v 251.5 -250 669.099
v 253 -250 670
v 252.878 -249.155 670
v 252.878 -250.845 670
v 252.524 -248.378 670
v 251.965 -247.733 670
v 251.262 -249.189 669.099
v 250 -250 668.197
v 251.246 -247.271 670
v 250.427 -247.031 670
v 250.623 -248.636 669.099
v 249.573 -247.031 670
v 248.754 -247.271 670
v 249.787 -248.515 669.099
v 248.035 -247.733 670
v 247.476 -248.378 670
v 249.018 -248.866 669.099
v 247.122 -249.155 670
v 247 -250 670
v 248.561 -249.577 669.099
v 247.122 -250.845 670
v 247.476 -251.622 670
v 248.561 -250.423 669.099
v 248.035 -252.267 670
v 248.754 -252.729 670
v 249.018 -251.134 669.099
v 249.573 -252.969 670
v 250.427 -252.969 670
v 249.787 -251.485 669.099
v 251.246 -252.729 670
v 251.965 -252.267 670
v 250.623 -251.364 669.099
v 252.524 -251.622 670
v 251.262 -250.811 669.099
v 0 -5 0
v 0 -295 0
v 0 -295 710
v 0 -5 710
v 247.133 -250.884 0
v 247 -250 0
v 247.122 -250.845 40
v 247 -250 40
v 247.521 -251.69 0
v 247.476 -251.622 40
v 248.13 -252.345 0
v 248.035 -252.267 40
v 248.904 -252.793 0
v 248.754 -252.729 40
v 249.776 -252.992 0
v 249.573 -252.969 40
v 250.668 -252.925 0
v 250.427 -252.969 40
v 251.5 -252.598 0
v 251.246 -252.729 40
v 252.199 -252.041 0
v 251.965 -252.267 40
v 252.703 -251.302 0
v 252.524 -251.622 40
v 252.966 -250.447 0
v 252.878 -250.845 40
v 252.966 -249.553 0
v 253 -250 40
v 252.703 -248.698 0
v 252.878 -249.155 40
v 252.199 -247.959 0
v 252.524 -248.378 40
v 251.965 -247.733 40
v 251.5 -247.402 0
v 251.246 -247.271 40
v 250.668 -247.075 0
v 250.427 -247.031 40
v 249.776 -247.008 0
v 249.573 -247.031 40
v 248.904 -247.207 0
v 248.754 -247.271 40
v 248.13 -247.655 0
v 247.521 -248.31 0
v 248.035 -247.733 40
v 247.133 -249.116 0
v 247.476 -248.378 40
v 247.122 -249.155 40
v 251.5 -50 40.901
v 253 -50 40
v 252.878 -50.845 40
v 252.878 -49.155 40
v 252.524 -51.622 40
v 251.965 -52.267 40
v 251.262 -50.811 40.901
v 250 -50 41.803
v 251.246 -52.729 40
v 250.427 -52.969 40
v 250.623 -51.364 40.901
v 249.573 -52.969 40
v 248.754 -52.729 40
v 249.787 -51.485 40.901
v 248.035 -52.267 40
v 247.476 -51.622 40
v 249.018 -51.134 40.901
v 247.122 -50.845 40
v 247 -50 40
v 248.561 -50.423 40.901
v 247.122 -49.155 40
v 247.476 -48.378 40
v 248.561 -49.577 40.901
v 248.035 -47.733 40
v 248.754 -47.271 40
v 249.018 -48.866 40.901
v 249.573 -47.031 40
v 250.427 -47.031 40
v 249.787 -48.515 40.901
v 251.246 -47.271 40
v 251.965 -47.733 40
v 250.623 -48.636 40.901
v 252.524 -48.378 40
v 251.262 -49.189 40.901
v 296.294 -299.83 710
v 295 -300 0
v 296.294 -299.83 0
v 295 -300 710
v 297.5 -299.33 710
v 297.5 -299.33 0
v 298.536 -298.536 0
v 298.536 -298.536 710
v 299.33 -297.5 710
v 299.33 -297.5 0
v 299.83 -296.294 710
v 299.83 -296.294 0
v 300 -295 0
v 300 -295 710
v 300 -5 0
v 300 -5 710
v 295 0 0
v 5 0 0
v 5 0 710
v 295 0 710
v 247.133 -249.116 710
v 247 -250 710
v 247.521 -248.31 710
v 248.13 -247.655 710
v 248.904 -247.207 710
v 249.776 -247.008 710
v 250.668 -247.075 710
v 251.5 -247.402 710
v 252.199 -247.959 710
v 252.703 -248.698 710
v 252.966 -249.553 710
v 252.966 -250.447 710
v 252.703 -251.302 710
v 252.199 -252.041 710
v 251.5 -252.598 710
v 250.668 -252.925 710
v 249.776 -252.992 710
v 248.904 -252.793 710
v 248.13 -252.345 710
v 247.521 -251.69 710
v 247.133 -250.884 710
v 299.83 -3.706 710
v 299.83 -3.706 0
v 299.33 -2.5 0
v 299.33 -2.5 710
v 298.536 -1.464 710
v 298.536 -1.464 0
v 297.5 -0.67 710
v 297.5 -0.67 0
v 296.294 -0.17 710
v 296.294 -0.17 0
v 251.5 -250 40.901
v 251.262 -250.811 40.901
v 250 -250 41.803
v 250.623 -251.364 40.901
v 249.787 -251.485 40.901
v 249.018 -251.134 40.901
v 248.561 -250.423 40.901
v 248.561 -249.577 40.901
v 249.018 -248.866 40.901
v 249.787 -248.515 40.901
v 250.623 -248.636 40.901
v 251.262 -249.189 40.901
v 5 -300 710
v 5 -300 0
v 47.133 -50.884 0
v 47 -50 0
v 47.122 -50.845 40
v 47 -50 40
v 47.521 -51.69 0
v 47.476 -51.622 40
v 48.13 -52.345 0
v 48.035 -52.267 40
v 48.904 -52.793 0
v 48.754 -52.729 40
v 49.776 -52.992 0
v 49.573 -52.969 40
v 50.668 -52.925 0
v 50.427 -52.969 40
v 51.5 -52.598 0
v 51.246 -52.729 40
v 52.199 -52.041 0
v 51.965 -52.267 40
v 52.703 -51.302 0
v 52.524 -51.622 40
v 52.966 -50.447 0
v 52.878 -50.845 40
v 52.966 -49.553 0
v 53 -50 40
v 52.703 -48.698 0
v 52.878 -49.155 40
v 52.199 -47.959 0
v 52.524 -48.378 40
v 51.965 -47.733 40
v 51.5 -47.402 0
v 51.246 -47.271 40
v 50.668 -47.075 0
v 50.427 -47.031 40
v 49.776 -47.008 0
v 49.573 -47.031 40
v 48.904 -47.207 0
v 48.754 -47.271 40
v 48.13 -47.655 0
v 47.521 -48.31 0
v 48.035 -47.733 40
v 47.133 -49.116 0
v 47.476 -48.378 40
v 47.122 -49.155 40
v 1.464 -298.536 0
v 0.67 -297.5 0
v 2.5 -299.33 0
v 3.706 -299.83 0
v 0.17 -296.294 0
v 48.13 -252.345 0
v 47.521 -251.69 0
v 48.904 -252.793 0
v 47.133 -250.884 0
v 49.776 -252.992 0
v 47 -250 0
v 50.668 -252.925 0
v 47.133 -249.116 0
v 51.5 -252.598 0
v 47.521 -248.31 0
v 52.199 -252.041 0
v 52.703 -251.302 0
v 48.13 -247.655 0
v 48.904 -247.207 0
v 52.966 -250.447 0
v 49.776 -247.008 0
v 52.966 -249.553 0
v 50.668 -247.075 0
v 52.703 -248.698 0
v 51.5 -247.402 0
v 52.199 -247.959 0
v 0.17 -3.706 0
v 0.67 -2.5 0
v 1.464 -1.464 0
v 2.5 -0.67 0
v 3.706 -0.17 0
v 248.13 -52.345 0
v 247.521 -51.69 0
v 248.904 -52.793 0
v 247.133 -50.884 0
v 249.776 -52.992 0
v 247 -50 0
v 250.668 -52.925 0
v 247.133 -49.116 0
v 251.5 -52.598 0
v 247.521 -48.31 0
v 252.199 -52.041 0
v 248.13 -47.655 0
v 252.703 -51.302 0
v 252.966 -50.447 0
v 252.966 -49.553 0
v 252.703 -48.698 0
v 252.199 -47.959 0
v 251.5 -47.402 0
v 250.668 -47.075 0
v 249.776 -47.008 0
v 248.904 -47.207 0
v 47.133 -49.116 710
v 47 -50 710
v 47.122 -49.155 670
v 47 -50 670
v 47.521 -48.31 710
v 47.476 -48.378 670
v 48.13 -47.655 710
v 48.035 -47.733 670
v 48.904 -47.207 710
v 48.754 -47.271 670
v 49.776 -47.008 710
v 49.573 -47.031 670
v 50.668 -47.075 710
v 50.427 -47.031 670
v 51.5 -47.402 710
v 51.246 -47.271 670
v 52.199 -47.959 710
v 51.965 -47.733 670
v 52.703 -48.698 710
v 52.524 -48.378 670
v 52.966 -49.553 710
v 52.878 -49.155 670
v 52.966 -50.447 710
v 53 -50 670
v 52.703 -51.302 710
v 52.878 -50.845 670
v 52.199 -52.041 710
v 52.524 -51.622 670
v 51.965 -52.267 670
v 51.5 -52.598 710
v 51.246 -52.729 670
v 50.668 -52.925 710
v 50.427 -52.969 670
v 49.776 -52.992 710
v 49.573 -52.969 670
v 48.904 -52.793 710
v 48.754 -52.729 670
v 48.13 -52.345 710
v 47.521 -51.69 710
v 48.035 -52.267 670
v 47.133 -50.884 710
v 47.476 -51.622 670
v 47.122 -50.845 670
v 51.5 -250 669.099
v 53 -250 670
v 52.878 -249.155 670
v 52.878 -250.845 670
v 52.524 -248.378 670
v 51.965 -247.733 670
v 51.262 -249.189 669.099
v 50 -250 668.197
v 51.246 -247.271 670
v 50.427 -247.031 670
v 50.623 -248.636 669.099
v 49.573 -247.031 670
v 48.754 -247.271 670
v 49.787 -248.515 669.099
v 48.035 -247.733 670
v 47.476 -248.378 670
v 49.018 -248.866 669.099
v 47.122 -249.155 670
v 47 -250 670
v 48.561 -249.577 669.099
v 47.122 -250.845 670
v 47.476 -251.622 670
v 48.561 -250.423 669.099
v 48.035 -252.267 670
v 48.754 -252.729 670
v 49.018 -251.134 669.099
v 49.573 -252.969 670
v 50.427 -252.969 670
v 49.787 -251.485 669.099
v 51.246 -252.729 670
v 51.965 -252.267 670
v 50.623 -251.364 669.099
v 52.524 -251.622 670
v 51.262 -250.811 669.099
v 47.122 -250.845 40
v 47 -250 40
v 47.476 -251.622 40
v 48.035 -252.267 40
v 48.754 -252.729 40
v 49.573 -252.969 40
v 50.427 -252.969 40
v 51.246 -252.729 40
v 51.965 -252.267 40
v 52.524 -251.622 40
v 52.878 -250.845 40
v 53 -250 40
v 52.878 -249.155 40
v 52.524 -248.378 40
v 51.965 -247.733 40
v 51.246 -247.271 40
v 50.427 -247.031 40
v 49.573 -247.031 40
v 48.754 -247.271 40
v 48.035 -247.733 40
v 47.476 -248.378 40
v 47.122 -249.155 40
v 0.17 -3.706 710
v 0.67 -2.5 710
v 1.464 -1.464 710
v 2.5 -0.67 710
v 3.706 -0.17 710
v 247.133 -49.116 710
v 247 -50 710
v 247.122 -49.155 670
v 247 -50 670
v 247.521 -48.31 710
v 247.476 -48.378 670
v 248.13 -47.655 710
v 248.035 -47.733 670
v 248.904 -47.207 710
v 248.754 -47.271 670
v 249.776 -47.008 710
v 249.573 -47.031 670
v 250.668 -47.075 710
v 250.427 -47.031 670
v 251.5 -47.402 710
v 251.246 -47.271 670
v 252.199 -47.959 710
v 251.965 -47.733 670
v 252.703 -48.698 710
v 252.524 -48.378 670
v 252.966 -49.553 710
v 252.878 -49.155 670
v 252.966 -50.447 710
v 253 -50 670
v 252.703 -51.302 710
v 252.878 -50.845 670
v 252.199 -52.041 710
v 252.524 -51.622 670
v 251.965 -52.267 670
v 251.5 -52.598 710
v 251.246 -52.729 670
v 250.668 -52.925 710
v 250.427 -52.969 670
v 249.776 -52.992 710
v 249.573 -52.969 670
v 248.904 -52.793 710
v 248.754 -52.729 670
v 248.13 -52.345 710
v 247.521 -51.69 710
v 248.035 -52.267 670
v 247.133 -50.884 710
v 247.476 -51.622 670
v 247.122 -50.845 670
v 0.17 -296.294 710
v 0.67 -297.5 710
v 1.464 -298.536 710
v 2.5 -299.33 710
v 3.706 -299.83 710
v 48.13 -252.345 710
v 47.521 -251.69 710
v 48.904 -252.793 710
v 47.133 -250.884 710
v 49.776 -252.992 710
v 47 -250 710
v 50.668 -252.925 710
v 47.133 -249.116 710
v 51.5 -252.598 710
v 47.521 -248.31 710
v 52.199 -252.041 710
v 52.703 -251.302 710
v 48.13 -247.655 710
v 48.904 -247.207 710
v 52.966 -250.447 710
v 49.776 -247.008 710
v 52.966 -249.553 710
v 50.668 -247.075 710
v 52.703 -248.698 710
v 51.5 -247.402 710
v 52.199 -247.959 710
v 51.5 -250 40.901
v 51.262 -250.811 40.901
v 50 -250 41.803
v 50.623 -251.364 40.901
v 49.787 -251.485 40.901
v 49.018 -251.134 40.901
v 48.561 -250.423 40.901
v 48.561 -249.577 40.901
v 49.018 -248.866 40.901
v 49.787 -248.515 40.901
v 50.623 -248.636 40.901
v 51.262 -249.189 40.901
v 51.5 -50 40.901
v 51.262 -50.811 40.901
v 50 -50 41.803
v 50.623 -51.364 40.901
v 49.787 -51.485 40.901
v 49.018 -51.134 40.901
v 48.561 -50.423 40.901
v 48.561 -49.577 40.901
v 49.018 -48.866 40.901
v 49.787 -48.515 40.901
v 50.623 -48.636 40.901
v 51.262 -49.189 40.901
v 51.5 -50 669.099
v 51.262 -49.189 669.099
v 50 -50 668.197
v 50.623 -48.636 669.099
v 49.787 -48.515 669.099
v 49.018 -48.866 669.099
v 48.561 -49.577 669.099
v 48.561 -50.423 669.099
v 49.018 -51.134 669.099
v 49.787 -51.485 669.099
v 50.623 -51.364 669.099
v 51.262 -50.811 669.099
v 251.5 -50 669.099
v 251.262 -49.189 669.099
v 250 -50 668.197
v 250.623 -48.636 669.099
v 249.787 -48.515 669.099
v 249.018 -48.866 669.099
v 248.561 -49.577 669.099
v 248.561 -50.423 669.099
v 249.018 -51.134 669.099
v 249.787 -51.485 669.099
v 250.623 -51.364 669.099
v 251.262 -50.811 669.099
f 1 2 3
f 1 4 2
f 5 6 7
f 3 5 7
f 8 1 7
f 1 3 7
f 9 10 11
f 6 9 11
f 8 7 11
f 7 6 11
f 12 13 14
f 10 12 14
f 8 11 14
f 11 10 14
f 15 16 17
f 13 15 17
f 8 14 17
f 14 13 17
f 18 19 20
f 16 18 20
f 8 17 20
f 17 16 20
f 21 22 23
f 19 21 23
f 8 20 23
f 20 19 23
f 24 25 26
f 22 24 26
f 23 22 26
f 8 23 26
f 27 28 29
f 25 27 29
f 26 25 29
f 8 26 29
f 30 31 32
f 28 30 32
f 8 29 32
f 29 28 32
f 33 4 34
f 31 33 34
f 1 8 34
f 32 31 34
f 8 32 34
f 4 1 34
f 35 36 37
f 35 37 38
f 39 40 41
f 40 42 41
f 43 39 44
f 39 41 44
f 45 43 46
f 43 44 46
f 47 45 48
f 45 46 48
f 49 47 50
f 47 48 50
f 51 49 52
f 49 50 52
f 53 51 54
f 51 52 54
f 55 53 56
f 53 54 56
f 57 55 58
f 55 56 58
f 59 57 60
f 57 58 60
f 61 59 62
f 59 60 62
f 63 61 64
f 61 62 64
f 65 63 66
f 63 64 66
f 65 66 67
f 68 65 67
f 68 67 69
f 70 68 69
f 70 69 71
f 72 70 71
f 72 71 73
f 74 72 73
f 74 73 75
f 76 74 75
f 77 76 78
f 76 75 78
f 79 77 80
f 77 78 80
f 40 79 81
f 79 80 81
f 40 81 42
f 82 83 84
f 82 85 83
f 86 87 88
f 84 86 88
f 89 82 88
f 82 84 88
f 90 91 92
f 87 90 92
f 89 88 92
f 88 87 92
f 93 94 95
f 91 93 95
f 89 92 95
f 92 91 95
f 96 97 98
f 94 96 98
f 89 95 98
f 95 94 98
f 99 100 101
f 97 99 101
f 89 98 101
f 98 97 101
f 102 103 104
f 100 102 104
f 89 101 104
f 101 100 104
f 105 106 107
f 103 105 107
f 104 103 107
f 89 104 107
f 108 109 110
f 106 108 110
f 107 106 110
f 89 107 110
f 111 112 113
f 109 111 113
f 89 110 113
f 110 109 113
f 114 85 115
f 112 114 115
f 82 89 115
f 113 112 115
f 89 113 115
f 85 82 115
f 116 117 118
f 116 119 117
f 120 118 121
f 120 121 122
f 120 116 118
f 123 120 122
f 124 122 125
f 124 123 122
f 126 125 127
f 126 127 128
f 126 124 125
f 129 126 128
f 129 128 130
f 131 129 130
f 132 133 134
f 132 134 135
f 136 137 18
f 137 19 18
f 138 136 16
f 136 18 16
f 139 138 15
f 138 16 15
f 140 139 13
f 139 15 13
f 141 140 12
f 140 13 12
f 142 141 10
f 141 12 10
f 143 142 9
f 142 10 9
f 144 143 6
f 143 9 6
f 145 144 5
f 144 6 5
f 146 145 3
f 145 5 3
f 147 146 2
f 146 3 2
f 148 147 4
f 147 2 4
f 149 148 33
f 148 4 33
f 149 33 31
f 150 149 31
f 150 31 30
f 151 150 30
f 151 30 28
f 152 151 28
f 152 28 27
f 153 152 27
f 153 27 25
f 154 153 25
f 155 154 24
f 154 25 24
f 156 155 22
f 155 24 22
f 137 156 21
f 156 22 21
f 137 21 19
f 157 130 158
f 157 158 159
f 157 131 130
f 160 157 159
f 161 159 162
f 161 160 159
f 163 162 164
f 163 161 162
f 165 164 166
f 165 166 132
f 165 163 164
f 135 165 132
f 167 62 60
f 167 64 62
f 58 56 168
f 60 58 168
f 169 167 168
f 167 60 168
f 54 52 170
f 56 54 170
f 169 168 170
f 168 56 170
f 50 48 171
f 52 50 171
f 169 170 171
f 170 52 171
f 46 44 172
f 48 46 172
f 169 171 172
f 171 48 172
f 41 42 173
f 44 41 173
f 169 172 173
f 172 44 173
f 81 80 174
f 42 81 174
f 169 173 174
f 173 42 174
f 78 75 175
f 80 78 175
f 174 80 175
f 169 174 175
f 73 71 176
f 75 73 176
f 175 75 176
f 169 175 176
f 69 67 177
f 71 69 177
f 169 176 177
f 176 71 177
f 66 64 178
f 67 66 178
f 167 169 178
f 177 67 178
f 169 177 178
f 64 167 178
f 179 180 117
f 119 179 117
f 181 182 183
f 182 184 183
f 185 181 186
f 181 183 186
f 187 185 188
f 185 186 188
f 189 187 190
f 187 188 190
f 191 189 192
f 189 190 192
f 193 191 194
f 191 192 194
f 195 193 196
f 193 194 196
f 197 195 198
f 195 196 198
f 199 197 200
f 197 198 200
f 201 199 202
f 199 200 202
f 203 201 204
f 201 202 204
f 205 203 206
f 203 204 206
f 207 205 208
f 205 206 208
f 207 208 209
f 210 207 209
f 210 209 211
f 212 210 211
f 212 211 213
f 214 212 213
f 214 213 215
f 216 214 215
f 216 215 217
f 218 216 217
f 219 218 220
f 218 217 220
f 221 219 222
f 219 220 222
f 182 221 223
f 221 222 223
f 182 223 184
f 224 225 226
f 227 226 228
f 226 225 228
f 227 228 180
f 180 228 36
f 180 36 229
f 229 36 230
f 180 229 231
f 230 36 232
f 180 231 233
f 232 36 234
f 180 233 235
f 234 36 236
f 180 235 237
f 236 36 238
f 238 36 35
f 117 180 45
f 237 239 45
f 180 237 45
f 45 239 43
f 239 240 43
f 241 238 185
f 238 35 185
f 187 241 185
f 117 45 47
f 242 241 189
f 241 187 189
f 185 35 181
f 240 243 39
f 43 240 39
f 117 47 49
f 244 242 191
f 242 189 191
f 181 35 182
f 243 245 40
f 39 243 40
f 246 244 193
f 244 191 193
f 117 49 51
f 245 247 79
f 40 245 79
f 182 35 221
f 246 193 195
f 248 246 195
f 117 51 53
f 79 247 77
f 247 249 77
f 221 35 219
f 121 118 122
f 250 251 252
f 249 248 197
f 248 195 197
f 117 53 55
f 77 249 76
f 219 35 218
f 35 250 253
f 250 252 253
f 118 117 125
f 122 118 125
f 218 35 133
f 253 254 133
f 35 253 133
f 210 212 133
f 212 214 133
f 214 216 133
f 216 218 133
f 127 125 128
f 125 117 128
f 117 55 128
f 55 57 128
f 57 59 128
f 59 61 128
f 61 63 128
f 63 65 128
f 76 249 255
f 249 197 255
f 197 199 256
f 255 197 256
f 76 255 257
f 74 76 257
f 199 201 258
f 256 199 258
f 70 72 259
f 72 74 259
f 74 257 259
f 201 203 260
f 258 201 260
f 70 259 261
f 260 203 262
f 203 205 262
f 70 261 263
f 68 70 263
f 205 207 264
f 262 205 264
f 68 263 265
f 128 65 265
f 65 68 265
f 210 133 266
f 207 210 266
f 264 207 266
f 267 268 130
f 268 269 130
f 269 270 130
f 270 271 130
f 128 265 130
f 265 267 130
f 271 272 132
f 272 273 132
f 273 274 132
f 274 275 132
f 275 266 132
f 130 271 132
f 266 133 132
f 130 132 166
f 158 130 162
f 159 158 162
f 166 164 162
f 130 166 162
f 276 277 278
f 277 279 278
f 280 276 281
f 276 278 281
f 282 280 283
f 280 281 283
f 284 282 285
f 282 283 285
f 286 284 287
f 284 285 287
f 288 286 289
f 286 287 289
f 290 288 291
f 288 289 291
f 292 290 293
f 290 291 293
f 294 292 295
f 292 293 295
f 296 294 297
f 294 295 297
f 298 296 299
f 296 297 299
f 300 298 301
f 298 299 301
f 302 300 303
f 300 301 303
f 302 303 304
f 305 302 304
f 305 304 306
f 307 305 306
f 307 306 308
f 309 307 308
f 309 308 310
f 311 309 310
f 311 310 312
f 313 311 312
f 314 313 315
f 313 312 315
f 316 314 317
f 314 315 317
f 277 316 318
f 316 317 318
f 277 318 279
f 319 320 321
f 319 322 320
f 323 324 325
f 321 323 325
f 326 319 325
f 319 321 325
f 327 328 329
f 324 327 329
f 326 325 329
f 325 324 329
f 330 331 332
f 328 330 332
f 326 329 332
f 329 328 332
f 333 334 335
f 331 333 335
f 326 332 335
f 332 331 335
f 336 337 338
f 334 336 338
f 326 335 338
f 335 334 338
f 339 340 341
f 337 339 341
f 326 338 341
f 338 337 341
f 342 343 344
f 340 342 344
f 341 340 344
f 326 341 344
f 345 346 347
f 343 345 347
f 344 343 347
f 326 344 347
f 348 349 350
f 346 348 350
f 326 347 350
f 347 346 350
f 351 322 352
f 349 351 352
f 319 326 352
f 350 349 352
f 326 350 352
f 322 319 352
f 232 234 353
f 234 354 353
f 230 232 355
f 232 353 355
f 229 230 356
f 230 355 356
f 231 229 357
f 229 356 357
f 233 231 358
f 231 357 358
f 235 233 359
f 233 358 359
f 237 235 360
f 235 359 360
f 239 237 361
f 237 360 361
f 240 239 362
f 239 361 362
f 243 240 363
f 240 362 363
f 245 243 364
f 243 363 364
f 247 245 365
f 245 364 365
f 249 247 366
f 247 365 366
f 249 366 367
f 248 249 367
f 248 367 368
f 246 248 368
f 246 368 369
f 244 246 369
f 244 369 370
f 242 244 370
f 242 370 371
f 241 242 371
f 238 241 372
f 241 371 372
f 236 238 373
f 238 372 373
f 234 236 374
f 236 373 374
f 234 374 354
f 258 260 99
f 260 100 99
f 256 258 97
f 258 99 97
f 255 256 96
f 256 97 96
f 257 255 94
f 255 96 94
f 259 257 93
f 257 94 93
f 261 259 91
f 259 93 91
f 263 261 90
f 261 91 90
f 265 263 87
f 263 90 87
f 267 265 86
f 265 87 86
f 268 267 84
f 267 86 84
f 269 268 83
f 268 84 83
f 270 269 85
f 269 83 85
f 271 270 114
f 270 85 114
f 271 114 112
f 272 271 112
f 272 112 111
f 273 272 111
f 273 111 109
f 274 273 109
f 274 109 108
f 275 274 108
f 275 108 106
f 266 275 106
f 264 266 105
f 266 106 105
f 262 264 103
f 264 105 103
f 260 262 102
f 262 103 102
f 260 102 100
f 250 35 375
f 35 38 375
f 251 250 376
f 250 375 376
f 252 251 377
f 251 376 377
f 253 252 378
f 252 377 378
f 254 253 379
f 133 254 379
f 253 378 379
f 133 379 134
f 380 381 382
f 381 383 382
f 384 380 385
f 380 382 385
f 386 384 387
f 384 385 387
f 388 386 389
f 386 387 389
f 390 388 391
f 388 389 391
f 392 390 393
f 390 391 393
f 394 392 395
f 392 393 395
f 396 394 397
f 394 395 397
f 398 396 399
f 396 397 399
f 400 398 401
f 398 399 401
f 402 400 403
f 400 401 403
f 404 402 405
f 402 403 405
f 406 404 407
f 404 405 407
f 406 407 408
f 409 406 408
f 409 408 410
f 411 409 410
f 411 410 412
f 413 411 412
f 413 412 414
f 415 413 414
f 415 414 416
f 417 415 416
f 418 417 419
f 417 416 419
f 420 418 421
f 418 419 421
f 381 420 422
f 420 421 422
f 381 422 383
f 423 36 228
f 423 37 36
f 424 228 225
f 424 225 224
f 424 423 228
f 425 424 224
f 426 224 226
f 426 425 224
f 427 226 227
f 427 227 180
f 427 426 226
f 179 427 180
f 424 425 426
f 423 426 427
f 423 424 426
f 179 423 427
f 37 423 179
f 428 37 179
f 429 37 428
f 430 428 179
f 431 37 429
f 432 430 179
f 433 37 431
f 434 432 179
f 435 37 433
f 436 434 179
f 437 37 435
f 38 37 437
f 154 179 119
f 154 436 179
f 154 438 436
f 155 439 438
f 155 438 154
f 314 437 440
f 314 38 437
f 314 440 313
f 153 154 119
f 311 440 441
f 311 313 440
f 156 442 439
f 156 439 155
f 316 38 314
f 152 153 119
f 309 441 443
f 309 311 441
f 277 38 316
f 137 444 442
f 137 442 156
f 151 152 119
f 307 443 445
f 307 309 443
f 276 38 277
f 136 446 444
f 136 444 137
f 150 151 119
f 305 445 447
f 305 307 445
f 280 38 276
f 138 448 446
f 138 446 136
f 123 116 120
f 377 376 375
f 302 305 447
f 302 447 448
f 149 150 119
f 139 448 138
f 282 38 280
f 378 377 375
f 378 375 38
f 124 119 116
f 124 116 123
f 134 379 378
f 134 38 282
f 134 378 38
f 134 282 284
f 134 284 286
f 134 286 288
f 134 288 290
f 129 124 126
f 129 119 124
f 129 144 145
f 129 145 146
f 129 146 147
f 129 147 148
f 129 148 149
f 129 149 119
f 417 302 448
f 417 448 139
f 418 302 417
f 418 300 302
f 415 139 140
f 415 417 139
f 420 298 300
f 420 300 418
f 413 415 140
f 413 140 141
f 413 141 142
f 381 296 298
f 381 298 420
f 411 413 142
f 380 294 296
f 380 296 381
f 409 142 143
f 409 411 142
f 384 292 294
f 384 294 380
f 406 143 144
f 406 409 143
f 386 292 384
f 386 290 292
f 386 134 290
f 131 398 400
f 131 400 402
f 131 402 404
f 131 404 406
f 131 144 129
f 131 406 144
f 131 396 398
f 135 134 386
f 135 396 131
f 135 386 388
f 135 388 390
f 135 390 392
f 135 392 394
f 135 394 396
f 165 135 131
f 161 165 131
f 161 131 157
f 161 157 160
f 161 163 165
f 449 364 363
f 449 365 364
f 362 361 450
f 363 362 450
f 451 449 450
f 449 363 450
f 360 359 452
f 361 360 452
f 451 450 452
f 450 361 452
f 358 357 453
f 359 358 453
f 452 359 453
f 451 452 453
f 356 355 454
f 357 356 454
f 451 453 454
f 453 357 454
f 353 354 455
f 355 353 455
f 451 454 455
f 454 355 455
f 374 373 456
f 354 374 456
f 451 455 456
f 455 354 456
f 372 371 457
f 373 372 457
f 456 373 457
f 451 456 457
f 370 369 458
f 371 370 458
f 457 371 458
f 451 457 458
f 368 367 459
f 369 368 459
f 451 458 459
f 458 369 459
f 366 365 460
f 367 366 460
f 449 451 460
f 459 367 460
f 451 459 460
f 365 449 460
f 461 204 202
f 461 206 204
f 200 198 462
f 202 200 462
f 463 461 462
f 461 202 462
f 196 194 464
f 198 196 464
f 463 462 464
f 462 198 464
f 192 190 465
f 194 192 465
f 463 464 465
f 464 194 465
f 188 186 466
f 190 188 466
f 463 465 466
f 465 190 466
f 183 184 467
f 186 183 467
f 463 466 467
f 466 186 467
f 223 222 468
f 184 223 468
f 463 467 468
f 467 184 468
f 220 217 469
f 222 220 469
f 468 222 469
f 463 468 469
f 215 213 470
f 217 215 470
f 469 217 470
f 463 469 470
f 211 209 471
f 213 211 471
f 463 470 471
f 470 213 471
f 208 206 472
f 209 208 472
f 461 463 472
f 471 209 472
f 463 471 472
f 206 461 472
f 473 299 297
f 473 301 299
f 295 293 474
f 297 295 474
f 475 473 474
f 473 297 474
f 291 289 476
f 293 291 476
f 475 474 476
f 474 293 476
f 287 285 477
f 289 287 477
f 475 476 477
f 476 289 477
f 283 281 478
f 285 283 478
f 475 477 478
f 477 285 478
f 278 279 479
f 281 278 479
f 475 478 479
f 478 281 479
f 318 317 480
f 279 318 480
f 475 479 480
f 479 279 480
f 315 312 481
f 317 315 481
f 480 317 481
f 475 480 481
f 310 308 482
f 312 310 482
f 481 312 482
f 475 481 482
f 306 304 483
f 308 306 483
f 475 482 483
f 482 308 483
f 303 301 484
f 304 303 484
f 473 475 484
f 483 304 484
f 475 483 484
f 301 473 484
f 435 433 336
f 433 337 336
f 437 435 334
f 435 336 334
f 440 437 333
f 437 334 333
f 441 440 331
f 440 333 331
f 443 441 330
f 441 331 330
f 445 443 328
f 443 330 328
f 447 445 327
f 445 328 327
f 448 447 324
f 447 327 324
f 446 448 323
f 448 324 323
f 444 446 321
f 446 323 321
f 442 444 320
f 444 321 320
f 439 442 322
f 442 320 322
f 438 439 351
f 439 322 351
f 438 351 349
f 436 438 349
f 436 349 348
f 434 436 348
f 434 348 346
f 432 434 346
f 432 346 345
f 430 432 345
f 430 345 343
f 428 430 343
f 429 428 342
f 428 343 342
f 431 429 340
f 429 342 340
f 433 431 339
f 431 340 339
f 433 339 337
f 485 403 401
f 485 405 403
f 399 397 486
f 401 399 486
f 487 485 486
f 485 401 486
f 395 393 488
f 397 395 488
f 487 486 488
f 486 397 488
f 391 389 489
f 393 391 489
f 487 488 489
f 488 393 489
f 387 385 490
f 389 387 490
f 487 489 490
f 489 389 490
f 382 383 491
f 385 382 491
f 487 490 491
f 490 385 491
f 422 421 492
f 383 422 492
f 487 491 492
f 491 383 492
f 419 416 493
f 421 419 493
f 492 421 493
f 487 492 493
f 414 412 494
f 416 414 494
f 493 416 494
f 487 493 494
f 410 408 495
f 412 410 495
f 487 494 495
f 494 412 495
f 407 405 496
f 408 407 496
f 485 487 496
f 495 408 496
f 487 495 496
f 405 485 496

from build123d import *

# Parameters (mm, degrees)
F0_W     = 300
F0_H     = 300
F1_DEPTH = 710
F2_R     = 5
F4_D     = 6
F4_DEPTH = 40
F4_TIP   = 1.8025818571
F6_D     = 6
F6_DEPTH = 40
F6_TIP   = 1.8025818571


with BuildPart() as f1:
    # F0 (on Top) → F1 (new body)
    with BuildSketch(Plane.XY):
        with Locations((150, -150)):
            Rectangle(F0_W, F0_H)
    extrude(amount=F1_DEPTH)

    # F2
    f2_edges = [f1.edges().sort_by_distance(p)[0] for p in [
        (0, -300, 355),
        (0, 0, 355),
        (300, 0, 355),
        (300, -300, 355),
    ]]
    fillet(f2_edges, radius=F2_R)

    # F4
    with Locations(Plane.XY.offset(710)):
        with Locations((250, -250), (250, -50), (50, -250), (50, -50)):
            Hole(F4_D / 2, depth=F4_DEPTH)
            with Locations((0, 0, -(F4_DEPTH + F4_TIP / 2))):  # 118° drill point
                Cone(0, F4_D / 2, F4_TIP, mode=Mode.SUBTRACT)

    # F6
    with Locations(Plane(origin=(0, 0, 0), x_dir=(1, 0, 0), z_dir=(0, 0, -1))):
        with Locations((50, 250), (50, 50), (250, 50), (250, 250)):
            Hole(F6_D / 2, depth=F6_DEPTH)
            with Locations((0, 0, -(F6_DEPTH + F6_TIP / 2))):  # 118° drill point
                Cone(0, F6_D / 2, F6_TIP, mode=Mode.SUBTRACT)


solid = f1.part
